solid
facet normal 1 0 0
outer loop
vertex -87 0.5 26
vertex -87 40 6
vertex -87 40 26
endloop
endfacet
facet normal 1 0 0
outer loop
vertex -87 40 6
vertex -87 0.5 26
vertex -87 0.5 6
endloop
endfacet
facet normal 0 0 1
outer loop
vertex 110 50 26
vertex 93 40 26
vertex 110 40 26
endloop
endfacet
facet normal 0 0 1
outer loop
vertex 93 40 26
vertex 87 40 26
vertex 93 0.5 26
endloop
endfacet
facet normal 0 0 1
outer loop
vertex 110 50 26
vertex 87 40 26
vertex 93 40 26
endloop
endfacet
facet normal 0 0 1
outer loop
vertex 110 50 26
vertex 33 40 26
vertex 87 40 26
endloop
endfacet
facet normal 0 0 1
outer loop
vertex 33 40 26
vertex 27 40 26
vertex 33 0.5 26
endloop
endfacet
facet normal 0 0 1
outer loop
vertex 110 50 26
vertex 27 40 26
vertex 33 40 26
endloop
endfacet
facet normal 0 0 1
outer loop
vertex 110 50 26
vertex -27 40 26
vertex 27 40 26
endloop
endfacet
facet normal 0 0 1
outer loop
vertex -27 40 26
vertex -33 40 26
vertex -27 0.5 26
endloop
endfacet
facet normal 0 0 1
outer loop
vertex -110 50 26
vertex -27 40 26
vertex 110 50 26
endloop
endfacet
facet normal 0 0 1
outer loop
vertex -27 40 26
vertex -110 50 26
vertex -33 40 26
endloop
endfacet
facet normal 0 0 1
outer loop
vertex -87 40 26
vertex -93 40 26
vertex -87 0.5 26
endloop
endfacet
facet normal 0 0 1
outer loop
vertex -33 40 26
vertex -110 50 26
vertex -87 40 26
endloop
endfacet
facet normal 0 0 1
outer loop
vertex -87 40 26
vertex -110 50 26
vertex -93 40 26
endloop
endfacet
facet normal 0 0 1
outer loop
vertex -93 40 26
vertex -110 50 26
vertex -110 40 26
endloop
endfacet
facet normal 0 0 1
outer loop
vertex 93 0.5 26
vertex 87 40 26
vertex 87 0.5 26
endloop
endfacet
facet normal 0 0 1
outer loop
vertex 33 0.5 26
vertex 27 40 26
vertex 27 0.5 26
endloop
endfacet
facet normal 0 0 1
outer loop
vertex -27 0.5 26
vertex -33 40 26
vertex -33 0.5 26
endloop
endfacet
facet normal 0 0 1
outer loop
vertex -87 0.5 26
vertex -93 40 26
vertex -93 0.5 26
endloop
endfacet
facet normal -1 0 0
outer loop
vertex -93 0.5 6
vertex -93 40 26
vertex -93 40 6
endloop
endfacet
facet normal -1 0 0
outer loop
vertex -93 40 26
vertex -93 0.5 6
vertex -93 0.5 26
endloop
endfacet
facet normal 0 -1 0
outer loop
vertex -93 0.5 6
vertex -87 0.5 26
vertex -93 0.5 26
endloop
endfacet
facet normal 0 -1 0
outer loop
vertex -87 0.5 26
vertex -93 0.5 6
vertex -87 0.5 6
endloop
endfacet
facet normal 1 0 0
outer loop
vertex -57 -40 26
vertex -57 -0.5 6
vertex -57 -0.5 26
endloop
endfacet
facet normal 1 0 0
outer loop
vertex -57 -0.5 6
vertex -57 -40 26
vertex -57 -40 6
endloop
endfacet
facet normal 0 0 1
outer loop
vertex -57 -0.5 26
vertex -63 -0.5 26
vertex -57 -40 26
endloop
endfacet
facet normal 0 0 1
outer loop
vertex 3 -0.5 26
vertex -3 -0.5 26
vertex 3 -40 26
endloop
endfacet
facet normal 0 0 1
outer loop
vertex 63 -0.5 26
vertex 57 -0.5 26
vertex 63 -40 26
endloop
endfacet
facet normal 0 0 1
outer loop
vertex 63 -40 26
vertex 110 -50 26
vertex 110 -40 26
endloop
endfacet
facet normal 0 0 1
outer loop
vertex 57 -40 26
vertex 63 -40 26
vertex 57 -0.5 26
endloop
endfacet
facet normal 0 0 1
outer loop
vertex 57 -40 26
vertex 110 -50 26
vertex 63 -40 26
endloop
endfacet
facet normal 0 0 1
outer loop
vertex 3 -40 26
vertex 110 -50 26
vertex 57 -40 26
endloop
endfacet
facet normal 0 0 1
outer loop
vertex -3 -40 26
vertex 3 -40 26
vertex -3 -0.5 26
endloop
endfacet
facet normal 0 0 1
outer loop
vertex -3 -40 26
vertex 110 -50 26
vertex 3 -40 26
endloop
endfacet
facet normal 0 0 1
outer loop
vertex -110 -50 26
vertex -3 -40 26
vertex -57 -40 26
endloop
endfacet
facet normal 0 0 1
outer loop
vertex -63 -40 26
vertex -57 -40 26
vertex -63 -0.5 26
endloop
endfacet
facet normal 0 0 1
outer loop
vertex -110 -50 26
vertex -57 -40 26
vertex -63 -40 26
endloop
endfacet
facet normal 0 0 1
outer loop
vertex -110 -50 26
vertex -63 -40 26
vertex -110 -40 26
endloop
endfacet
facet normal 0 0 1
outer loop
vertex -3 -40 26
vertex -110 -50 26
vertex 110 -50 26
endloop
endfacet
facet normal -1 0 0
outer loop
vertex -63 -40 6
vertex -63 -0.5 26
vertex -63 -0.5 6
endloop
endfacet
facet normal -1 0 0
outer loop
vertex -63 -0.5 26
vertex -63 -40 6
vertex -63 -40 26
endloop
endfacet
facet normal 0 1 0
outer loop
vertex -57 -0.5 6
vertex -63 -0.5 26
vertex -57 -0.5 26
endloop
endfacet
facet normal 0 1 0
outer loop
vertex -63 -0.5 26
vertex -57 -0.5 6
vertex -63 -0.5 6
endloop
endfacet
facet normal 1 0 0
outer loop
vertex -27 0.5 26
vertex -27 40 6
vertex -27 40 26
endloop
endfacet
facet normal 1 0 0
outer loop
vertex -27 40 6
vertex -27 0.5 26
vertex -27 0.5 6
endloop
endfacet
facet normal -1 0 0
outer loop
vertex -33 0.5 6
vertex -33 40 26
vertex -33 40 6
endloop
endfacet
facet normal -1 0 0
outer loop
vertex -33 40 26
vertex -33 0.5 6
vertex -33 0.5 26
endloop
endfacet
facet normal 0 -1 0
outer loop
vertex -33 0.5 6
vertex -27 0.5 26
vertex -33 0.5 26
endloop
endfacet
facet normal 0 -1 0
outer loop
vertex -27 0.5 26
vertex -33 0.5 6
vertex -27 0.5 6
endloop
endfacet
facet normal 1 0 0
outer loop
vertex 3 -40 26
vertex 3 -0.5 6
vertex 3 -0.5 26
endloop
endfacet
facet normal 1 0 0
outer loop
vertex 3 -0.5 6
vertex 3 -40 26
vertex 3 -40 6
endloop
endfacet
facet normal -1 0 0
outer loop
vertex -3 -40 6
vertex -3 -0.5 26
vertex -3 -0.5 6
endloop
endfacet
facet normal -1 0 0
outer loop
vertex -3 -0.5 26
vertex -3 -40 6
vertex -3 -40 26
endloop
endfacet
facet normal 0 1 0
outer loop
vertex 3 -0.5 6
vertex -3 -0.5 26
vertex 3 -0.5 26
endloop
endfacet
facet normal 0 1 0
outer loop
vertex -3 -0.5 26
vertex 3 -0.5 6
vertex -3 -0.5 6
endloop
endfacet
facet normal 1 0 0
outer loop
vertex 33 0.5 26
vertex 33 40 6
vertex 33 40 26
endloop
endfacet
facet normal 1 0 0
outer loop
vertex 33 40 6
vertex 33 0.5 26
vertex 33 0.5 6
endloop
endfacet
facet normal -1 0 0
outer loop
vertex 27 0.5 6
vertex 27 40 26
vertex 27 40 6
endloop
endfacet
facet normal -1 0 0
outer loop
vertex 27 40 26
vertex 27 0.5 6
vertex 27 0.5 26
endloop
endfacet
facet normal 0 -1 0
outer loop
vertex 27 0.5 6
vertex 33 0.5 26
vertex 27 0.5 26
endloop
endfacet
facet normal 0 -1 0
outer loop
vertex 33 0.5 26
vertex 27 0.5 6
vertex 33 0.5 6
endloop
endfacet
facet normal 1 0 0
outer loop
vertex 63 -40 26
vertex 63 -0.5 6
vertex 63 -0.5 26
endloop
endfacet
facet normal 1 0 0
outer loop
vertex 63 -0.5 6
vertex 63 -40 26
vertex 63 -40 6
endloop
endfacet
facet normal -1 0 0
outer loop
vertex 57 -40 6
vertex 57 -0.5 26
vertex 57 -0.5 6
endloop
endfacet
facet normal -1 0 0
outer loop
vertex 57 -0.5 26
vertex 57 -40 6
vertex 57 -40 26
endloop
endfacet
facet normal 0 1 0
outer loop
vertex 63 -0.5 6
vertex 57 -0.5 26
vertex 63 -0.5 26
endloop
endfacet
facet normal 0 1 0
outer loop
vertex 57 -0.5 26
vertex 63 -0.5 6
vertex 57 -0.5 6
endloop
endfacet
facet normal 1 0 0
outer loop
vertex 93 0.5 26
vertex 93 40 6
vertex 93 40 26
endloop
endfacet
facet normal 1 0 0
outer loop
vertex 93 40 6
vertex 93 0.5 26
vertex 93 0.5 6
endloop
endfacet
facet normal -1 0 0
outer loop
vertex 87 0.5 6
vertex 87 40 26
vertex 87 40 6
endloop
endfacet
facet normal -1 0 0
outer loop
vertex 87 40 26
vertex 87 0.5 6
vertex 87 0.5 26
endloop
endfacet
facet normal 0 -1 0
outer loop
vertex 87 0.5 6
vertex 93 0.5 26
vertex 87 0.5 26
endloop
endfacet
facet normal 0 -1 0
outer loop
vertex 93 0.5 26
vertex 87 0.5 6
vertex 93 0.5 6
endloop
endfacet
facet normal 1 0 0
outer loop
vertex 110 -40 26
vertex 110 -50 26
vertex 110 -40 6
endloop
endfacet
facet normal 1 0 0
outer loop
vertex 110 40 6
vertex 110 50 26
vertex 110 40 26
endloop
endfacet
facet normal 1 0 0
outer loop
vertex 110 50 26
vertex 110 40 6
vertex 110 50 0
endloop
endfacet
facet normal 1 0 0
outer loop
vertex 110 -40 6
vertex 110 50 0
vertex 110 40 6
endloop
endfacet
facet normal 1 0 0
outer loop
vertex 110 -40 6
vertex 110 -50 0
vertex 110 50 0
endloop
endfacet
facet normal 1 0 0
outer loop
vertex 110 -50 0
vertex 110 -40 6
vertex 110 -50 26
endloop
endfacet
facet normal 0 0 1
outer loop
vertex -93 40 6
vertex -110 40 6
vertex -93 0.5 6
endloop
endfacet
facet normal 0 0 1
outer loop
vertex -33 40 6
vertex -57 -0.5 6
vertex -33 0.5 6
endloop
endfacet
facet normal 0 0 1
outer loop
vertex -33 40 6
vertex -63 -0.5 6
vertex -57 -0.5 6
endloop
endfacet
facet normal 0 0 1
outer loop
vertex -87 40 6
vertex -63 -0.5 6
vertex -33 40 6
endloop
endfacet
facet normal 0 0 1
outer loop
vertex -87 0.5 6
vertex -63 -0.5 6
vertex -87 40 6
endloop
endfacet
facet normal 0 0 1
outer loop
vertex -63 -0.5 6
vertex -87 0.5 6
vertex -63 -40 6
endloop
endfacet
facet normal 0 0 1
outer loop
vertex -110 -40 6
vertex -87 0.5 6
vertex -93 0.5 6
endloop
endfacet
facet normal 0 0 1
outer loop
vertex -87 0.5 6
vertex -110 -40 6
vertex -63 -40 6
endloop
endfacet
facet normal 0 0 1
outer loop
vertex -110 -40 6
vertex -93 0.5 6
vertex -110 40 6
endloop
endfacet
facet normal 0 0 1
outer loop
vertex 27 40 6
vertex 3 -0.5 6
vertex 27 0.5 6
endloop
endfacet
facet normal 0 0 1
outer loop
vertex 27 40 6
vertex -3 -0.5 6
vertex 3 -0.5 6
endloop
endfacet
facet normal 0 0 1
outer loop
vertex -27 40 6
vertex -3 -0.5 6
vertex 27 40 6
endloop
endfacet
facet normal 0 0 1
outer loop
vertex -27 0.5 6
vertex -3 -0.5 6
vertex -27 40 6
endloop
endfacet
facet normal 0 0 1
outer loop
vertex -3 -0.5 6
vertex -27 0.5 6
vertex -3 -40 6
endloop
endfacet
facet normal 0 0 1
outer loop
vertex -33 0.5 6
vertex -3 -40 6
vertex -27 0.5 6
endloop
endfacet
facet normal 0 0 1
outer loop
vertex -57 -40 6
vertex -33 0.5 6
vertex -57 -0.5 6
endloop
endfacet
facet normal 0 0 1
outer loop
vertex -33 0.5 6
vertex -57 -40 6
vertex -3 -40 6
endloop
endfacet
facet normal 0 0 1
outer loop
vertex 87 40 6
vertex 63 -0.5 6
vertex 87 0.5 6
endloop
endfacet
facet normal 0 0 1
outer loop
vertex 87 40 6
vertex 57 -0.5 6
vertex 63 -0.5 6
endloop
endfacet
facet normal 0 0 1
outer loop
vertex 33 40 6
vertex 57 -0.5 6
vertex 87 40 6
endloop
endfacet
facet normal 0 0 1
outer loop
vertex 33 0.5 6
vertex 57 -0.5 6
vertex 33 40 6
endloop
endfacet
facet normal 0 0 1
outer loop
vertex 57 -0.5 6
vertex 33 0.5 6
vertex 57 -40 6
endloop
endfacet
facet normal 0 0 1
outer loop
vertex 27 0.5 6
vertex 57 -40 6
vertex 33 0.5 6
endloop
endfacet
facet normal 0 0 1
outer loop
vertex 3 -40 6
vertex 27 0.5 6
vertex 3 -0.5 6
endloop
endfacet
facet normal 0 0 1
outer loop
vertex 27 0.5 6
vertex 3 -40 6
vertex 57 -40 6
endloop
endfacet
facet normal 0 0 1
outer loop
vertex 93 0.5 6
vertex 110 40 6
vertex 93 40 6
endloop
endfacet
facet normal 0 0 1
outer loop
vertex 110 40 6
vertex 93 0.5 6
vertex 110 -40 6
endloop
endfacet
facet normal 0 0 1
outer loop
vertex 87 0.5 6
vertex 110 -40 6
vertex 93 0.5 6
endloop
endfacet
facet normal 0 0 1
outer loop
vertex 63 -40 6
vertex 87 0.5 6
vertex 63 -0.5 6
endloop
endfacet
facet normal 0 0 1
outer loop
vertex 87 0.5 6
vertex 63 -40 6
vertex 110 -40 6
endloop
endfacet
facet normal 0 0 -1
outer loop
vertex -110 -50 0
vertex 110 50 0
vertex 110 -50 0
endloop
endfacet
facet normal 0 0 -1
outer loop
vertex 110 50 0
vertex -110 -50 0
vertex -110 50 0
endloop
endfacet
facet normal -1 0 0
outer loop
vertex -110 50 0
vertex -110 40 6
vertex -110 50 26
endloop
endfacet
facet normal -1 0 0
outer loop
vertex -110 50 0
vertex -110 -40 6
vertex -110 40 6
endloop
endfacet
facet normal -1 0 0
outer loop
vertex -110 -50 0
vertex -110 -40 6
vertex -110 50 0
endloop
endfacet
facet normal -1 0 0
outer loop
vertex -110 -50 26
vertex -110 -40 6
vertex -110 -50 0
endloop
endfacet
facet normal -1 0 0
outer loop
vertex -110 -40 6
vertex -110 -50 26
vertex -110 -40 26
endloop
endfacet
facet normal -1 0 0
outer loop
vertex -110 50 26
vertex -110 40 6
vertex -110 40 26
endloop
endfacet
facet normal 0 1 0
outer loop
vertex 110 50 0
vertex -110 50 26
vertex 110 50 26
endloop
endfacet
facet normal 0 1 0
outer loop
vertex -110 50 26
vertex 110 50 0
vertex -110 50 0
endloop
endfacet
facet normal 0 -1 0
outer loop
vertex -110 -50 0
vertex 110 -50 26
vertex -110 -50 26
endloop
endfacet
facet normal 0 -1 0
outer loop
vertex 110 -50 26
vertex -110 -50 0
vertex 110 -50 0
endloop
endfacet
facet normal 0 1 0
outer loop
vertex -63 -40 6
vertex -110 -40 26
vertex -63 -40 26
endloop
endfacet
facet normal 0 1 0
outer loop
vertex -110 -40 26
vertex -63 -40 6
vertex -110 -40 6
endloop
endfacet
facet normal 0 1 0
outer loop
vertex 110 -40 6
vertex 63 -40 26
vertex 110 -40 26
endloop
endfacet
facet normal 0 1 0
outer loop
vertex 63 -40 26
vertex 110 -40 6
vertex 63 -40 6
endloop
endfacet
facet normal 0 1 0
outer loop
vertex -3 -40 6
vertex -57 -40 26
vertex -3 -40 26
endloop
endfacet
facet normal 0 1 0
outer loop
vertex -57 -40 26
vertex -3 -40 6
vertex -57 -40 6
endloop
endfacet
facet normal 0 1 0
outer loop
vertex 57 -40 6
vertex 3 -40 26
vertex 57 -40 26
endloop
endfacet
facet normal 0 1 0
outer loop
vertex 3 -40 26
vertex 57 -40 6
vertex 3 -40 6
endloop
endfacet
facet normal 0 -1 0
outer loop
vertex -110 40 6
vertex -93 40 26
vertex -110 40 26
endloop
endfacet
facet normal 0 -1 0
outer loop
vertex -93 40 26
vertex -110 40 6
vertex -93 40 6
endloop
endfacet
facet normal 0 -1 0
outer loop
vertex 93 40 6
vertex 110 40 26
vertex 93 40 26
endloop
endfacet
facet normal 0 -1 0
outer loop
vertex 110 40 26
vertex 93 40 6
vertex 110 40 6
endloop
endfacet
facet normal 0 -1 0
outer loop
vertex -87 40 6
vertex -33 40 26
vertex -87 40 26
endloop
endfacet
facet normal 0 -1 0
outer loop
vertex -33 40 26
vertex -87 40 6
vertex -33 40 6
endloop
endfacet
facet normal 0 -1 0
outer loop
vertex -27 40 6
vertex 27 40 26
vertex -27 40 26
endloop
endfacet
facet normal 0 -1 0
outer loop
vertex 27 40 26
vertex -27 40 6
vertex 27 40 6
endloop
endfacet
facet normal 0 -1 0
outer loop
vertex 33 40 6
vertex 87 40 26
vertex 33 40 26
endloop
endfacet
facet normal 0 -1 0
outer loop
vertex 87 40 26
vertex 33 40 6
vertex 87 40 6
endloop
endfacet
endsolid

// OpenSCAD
$fn = 32;

// ----------------------------------------------------------------------
// Rib frame 220 x 100 x 26
// 7 ribs at 30 mm pitch, staggered
// ----------------------------------------------------------------------

// --- parameters (mm) ---
frame = [220, 100, 6];  // base plate size (x, y, z)
rail_w = 10;            // side rail width
ribs = 7;               // number of ribs
rib_t = 6;              // rib thickness
rib_h = 20;             // rib height above the base plate
pitch = 30;             // pitch between rib centres

// --- derived feature positions (mm) ---
span = (ribs - 1) * pitch;          // = 180   distance between the outer ribs
origin_x = -span / 2;               // = -90   X of the first rib
rib_len = frame[1] / 2 - rail_w + 0.5;  // = 40.5   length of a staggered rib
rib_y = 0.5 + rib_len / 2;          // = 20.75   Y of a staggered rib centre
row_offset = 2 * rib_y;             // = 41.5   distance between the two rows
feature_centers = [
  [origin_x + 0 * pitch, rib_y],
  [origin_x + 1 * pitch, -rib_y],
  [origin_x + 2 * pitch, rib_y],
  [origin_x + 3 * pitch, -rib_y],
  [origin_x + 4 * pitch, rib_y],
  [origin_x + 5 * pitch, -rib_y],
  [origin_x + 6 * pitch, rib_y]
];   // rib centre line, drives the rib loop

// base plate, two side rails, then the ribs read straight off feature_centers
union() {
  translate([-frame[0] / 2, -frame[1] / 2, 0]) cube(frame);
  translate([-frame[0] / 2, -frame[1] / 2, 0]) cube([frame[0], rail_w, frame[2] + rib_h]);
  translate([-frame[0] / 2, frame[1] / 2 - rail_w, 0]) cube([frame[0], rail_w, frame[2] + rib_h]);
  for (centre = feature_centers)
    translate([centre[0] - rib_t / 2, centre[1] - rib_len / 2, frame[2] - 1])
      cube([rib_t, rib_len, rib_h + 1]);
}
